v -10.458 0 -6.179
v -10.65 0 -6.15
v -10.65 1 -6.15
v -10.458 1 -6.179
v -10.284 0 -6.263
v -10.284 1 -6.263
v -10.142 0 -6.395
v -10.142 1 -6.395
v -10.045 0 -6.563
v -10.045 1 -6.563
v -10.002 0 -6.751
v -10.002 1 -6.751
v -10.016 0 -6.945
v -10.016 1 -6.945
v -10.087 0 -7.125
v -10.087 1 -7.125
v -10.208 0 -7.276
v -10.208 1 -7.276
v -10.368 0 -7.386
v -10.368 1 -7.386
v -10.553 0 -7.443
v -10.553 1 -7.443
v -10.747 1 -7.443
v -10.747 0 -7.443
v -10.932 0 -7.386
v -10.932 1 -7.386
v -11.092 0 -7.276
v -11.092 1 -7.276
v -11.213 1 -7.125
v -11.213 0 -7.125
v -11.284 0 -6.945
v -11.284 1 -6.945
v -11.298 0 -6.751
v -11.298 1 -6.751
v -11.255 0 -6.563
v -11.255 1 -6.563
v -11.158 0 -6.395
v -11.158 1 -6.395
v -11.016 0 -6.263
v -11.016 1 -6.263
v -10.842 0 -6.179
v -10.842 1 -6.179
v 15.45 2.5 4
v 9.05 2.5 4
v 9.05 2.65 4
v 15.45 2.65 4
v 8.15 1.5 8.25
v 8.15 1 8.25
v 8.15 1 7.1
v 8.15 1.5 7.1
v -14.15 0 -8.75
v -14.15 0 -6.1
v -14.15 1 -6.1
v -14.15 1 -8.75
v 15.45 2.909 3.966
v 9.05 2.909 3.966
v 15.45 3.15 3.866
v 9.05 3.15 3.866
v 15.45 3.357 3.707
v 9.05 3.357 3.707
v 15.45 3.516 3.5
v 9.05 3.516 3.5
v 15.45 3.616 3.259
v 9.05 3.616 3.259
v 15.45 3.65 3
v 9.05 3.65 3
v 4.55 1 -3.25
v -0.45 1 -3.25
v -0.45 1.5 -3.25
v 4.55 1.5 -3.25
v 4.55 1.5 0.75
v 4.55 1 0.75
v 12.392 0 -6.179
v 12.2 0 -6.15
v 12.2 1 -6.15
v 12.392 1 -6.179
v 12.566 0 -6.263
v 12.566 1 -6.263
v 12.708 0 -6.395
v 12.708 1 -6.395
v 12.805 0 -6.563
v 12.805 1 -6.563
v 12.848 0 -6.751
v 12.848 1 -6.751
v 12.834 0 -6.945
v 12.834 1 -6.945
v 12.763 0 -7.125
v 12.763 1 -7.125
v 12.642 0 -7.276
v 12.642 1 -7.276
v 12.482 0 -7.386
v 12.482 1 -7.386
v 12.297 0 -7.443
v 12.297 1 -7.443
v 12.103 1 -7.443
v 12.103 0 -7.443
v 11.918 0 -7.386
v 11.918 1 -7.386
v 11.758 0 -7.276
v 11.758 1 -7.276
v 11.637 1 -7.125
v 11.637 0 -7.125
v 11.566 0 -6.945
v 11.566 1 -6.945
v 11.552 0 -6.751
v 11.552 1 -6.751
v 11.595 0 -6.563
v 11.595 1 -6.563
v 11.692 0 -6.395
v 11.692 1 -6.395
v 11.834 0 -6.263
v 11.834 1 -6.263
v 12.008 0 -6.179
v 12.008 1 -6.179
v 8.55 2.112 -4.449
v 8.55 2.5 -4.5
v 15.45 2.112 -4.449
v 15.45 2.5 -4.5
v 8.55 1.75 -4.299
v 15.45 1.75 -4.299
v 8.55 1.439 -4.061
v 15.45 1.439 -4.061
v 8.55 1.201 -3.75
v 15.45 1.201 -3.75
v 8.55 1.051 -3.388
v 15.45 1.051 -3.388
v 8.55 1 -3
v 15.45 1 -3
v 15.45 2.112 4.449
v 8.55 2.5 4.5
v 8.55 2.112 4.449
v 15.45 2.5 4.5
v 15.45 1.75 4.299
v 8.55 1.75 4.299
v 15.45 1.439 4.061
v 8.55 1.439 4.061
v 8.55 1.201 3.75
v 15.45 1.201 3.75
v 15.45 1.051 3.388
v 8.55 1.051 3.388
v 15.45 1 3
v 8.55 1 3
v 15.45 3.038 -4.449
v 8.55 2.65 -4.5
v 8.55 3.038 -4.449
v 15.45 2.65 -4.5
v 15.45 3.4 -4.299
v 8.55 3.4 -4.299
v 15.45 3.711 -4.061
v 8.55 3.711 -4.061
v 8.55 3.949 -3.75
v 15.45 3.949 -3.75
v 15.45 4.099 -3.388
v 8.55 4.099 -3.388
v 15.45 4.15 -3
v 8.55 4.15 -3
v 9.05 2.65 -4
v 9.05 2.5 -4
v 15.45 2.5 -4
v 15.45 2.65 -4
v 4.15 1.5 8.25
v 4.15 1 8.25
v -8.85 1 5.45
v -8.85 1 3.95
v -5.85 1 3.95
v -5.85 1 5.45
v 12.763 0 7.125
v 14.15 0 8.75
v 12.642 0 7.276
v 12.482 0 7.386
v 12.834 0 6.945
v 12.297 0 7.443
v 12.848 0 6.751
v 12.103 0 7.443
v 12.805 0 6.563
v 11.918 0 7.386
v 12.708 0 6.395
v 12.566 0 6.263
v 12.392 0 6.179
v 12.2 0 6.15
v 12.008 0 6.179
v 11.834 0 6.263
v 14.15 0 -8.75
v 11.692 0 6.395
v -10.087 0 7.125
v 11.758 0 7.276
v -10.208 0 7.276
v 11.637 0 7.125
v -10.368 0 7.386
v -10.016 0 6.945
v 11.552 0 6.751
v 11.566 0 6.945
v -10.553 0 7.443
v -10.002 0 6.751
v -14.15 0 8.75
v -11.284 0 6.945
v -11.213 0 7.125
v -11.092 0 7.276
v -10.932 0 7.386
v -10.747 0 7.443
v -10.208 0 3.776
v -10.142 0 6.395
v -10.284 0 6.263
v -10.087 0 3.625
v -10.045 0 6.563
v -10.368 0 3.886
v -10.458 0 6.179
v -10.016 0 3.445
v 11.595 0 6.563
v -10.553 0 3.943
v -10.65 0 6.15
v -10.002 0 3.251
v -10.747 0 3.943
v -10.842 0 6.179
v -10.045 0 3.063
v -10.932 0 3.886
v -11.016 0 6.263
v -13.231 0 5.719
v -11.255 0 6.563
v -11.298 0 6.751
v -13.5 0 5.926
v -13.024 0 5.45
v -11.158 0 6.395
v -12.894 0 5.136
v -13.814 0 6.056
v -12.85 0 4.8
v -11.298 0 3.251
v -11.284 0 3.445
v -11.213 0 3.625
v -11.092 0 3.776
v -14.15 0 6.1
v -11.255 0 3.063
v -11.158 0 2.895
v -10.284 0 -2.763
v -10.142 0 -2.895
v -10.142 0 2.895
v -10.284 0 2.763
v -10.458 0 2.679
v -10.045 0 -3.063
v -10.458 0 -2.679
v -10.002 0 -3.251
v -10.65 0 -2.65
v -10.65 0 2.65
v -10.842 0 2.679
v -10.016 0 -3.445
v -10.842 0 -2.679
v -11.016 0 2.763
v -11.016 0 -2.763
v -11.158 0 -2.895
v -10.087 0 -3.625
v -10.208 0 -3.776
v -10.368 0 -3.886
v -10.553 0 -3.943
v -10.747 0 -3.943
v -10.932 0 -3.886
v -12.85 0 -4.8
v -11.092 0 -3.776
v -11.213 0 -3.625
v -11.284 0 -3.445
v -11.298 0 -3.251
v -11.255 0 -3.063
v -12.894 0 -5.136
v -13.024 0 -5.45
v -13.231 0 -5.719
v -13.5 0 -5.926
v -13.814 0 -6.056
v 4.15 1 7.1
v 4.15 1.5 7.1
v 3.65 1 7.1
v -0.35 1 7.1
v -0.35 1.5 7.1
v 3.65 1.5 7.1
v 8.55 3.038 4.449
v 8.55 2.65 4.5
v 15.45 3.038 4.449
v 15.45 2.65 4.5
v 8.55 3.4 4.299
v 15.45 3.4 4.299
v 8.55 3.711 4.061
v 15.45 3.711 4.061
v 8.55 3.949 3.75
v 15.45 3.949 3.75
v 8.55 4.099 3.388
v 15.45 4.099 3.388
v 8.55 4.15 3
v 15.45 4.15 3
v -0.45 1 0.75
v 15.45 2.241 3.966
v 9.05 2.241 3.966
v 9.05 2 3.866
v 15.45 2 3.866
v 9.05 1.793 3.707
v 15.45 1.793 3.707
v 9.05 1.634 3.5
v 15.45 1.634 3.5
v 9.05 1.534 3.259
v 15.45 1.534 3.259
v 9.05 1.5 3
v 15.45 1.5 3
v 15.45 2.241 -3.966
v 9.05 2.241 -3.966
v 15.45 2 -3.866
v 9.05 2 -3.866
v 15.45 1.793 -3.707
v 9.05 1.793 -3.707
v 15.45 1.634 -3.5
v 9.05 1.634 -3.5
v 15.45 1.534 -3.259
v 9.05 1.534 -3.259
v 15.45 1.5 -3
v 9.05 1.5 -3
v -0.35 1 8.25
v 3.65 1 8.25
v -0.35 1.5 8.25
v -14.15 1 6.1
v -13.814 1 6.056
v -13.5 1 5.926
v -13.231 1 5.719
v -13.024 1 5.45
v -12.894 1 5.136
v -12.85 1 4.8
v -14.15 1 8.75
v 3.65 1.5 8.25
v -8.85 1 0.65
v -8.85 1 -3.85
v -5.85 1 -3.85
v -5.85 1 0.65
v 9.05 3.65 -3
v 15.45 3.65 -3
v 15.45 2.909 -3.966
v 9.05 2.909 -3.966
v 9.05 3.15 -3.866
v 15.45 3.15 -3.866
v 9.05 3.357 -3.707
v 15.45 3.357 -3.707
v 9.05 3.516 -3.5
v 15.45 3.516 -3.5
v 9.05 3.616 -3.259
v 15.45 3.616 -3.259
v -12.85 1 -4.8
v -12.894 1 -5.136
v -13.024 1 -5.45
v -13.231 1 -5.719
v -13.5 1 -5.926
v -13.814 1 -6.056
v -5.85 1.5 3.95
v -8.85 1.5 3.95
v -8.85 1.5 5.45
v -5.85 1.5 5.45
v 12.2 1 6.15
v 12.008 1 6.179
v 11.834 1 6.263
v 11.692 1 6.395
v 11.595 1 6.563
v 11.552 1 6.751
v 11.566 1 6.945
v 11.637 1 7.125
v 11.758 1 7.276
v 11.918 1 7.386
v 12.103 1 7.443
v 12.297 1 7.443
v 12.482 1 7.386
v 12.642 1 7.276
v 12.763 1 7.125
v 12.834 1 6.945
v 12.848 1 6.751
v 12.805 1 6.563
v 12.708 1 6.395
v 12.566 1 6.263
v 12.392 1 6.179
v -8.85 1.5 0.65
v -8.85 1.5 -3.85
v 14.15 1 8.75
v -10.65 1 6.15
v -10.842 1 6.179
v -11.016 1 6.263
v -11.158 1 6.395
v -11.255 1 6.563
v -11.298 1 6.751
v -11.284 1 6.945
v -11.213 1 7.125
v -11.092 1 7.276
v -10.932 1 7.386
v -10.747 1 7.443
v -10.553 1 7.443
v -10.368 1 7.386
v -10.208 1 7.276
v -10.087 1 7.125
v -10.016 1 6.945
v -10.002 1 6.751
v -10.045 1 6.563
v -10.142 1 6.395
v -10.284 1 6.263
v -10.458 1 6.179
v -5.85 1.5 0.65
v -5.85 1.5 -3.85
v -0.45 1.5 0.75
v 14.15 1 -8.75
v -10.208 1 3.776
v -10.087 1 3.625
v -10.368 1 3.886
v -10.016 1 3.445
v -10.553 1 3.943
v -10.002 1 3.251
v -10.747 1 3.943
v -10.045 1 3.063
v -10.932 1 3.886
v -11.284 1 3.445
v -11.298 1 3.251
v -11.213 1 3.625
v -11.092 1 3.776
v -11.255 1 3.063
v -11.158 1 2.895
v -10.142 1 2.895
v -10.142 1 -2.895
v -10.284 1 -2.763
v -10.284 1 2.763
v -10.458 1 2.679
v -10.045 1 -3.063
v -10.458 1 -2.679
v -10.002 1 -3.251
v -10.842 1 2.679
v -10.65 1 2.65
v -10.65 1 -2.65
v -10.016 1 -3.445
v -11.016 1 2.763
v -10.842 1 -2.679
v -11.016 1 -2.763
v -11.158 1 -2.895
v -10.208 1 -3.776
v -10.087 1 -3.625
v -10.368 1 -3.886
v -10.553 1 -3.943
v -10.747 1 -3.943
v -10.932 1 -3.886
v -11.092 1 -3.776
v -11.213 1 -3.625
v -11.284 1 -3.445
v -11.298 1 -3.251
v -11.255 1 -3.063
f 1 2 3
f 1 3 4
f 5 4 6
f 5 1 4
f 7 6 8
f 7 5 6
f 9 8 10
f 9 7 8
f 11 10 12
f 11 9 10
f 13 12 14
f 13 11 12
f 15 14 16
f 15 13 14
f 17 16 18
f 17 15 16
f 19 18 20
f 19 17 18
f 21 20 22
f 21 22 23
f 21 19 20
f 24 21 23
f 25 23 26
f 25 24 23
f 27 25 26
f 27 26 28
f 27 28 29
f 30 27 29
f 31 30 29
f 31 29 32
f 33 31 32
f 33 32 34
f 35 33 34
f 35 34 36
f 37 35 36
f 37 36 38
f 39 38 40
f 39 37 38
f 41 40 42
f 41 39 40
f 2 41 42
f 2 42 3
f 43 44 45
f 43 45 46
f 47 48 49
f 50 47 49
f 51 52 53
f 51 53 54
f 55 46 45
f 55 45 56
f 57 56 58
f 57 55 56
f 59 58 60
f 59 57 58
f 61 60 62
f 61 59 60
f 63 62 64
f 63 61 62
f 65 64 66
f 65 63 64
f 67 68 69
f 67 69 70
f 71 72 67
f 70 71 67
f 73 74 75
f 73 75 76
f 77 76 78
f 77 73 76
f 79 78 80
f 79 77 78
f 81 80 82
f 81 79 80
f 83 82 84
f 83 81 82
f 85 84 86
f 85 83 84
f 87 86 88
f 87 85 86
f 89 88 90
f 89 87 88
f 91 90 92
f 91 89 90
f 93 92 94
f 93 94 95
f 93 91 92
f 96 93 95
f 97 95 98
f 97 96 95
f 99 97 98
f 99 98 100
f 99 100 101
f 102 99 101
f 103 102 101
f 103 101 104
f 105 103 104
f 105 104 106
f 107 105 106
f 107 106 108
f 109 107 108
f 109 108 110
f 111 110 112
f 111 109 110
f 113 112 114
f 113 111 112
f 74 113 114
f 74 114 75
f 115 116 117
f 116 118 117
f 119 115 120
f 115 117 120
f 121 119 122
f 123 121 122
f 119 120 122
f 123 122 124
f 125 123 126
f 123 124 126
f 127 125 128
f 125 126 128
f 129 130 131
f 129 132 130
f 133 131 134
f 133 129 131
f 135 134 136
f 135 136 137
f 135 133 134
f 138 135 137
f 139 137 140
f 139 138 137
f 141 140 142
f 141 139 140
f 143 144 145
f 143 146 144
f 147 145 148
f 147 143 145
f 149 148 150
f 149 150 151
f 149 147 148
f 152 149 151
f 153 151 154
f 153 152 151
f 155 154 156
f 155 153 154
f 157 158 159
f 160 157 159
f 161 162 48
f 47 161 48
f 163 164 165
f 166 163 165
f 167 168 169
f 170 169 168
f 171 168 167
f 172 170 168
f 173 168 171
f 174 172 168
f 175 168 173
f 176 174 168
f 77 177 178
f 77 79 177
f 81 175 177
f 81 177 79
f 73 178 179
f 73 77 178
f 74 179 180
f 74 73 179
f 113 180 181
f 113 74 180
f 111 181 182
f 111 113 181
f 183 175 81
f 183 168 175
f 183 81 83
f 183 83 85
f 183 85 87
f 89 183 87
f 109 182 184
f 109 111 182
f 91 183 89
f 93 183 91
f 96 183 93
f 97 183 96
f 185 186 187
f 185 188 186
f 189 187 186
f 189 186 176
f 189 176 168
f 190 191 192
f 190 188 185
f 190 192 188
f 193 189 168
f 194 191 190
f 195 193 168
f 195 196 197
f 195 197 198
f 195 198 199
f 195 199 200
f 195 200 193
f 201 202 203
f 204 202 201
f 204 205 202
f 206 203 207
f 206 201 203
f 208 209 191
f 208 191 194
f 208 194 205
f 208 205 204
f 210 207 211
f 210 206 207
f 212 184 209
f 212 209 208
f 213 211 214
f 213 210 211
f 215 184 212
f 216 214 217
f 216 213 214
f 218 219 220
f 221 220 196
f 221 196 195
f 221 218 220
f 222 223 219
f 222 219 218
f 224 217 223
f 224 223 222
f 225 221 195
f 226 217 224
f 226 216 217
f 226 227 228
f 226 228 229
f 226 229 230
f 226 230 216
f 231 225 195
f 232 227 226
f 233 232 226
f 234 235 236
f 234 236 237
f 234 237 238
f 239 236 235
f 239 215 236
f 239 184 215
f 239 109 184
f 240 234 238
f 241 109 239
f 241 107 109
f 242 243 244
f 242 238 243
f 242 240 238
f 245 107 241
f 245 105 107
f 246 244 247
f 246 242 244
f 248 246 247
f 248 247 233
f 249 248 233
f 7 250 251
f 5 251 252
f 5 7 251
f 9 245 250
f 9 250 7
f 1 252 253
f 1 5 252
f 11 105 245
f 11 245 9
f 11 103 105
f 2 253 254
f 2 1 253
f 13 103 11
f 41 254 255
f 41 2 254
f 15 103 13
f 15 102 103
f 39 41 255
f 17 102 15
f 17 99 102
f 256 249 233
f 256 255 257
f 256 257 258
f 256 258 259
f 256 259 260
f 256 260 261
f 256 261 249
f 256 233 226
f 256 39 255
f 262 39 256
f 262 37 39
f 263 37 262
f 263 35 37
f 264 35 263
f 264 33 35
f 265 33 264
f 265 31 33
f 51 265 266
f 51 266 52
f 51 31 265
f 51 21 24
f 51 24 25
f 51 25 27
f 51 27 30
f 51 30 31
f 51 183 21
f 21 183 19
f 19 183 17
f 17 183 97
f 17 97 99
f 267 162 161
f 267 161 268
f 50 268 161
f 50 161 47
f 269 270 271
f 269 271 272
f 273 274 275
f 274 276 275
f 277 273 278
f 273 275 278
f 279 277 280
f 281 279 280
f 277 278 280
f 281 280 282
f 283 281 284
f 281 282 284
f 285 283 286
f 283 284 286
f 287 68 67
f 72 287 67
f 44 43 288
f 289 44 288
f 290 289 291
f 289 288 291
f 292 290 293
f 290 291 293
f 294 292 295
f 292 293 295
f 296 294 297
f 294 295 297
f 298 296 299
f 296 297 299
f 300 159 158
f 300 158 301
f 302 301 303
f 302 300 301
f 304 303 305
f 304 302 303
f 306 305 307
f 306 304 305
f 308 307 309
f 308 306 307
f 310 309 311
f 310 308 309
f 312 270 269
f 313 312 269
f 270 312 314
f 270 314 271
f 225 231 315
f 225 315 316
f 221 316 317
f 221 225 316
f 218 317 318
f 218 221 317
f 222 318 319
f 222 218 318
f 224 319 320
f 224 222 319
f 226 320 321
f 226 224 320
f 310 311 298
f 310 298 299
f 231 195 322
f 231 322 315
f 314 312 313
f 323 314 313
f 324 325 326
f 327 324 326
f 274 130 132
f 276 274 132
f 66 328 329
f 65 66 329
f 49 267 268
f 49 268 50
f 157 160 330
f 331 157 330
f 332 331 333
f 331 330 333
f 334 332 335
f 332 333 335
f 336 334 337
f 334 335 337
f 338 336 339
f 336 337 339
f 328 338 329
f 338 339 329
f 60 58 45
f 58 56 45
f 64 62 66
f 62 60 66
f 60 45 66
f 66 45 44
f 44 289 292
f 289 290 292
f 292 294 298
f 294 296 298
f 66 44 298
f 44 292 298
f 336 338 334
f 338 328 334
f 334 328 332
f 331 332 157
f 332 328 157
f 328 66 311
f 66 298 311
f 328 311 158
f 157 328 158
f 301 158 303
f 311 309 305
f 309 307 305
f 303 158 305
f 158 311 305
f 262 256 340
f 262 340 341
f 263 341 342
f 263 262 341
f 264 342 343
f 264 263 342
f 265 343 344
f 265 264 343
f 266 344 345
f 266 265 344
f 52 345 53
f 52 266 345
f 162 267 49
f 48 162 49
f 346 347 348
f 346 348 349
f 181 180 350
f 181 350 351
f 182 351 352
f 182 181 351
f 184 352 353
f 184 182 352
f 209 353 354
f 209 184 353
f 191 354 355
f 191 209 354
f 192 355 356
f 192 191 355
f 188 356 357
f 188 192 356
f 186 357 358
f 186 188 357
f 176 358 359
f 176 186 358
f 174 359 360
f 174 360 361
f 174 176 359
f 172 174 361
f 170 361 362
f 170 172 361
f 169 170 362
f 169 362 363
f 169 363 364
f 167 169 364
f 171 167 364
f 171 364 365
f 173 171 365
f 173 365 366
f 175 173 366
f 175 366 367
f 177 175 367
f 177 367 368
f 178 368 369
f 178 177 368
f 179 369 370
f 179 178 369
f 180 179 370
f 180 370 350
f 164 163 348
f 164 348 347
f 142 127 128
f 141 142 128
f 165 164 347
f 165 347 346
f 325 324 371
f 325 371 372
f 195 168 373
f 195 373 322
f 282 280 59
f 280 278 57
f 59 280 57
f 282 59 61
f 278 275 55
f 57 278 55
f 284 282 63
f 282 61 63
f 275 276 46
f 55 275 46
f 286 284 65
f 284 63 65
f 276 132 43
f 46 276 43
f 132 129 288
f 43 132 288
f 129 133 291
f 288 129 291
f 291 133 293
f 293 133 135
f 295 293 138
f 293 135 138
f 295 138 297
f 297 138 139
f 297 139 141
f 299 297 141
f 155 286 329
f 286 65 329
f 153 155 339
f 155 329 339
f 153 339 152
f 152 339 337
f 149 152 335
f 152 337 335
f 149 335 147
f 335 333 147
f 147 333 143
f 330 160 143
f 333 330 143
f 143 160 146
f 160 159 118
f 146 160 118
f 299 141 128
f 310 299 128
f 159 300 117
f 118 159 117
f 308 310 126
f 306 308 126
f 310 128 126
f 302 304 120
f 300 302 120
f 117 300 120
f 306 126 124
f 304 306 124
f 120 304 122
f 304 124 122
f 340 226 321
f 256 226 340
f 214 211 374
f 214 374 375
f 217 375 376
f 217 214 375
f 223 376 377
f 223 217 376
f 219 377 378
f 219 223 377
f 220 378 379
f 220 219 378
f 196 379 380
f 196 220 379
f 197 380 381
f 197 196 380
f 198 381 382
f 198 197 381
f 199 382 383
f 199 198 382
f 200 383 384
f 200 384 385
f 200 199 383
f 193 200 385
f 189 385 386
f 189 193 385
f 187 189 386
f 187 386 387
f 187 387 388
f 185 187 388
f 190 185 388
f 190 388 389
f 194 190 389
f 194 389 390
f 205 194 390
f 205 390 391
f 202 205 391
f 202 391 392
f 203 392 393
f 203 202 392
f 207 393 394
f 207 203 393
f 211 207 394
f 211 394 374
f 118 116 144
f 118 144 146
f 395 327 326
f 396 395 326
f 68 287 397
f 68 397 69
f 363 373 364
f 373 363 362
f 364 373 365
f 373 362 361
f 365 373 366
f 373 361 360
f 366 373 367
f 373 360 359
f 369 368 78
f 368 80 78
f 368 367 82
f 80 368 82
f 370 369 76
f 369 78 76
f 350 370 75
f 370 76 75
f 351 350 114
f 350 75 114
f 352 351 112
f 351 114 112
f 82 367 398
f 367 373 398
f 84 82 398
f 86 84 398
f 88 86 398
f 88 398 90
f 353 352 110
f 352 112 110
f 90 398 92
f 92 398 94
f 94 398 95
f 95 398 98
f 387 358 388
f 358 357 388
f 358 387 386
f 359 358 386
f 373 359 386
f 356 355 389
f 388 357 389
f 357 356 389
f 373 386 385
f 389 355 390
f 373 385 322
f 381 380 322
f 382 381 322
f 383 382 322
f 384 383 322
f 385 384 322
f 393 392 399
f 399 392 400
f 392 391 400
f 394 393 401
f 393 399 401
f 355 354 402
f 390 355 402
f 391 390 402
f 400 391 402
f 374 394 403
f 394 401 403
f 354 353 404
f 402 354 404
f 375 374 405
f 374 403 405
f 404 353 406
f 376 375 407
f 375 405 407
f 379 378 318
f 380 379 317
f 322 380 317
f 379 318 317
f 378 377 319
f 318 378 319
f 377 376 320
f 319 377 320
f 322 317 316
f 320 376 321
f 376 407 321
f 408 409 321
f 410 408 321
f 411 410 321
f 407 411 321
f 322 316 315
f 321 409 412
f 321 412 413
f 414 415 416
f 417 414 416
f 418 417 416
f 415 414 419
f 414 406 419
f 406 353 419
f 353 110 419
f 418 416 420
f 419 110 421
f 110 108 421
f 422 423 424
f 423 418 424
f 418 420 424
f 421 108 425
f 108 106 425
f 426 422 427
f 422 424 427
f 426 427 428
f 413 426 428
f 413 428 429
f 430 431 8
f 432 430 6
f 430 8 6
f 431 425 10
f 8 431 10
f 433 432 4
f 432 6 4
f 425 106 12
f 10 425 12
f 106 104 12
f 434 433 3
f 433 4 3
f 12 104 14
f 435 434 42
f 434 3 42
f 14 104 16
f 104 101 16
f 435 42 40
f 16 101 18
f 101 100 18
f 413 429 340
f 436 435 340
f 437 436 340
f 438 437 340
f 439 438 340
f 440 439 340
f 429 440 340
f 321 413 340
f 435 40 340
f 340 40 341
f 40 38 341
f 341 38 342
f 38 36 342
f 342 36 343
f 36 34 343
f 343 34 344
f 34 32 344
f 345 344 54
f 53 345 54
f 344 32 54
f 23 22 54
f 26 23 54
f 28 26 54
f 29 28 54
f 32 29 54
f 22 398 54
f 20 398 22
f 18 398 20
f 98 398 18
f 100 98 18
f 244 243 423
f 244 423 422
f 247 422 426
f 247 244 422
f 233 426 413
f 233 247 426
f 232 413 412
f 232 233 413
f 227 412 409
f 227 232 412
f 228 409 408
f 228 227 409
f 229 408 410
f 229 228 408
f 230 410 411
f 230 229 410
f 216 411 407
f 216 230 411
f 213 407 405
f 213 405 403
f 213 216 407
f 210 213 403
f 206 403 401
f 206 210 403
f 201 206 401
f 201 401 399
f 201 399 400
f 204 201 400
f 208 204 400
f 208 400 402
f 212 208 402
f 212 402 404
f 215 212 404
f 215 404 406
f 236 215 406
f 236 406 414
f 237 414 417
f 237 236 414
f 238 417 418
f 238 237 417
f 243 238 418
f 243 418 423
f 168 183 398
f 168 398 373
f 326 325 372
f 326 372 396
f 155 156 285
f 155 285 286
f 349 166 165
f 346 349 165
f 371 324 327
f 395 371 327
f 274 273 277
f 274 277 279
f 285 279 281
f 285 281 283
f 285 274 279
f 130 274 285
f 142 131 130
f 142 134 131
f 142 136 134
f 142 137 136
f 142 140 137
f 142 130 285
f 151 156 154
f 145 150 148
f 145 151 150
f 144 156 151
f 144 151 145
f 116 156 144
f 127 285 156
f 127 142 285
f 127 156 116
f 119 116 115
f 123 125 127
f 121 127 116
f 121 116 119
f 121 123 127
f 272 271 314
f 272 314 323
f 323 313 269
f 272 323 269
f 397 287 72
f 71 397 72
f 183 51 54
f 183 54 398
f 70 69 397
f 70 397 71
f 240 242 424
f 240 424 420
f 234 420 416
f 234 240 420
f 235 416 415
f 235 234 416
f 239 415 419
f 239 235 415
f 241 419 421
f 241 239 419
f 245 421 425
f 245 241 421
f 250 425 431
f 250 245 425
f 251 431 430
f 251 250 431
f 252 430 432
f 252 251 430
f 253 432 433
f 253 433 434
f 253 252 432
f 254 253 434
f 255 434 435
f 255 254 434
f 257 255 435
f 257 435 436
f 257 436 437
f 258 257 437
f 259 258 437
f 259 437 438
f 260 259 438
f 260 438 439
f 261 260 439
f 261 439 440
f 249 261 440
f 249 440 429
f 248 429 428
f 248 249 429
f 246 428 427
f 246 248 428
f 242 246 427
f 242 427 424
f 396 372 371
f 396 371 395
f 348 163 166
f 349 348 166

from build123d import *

# Parameters (mm, degrees)
CROQUIS1_R                = 0.65
SALIENTE_EXTRUIR1_DEPTH   = 1
CROQUIS2_W                = 6.9
CROQUIS2_H                = 9
SALIENTE_EXTRUIR2_DEPTH   = 3.15
REDONDEO1_R               = 1.5
VACIADO1_T                = -0.5
CROQUIS3_W                = 4
CROQUIS3_H                = 1.15
SALIENTE_EXTRUIR3_DEPTH   = 0.5
SALIENTE_EXTRUIR3_2_DEPTH = 0.5
CROQUIS4_W                = 3
CROQUIS4_H                = 1.5
SALIENTE_EXTRUIR4_DEPTH   = 0.5
CROQUIS4_H_2              = 4.5
SALIENTE_EXTRUIR4_2_DEPTH = 0.5
CROQUIS4_W_2              = 5
CROQUIS4_H_3              = 4
SALIENTE_EXTRUIR4_3_DEPTH = 0.5


with BuildPart() as part:
    # Croquis1 → Saliente-Extruir1 (new body)
    with BuildSketch(Plane(origin=(0, 0, 0), x_dir=(1, 0, 0), z_dir=(0, 1, 0))):
        with BuildLine():
            Line((-14.15, 8.75), (14.15, 8.75))
            Line((14.15, 8.75), (14.15, -8.75))
            Line((14.15, -8.75), (-14.15, -8.75))
            Line((-14.15, -8.75), (-14.15, -6.1))
            ThreePointArc((-14.15, -6.1), (-13.230761184, -5.719238816), (-12.85, -4.8))
            Line((-12.85, -4.8), (-12.85, 4.8))
            ThreePointArc((-12.85, 4.8), (-13.230761184, 5.719238816), (-14.15, 6.1))
            Line((-14.15, 6.1), (-14.15, 8.75))
        make_face()
        with Locations(Location((12.2, 6.8, 0), (0, 0, 270))):
            Circle(CROQUIS1_R, mode=Mode.SUBTRACT)
        with Locations(Location((12.2, -6.8, 0), (0, 0, 90))):
            Circle(CROQUIS1_R, mode=Mode.SUBTRACT)
        with Locations(Location((-10.65, 6.8, 0), (0, 0, 270))):
            Circle(CROQUIS1_R, mode=Mode.SUBTRACT)
        with Locations(Location((-10.65, 3.3, 0), (0, 0, 270))):
            Circle(CROQUIS1_R, mode=Mode.SUBTRACT)
        with Locations(Location((-10.65, -3.3, 0), (0, 0, 90))):
            Circle(CROQUIS1_R, mode=Mode.SUBTRACT)
        with Locations(Location((-10.65, -6.8, 0), (0, 0, 90))):
            Circle(CROQUIS1_R, mode=Mode.SUBTRACT)
    extrude(amount=SALIENTE_EXTRUIR1_DEPTH)


with BuildPart() as body_2:
    # Croquis2 → Saliente-Extruir2 (new body)
    with BuildSketch(Plane(origin=(0, 1, 0), x_dir=(1, 0, 0), z_dir=(0, 1, 0))):
        with Locations((12, 0)):
            Rectangle(CROQUIS2_W, CROQUIS2_H)
    extrude(amount=SALIENTE_EXTRUIR2_DEPTH)

    # Redondeo1
    redondeo1_edges = [body_2.edges().sort_by_distance(p)[0] for p in [
        (12, 4.15, -4.5),
        (12, 1, -4.5),
        (12, 1, 4.5),
        (12, 4.15, 4.5),
    ]]
    fillet(redondeo1_edges, radius=REDONDEO1_R)

    # Vaciado1
    vaciado1_openings = [body_2.faces().sort_by_distance(p)[0] for p in [
        (15.45, 2.575, 0),
    ]]
    offset(amount=VACIADO1_T, openings=vaciado1_openings, kind=Kind.INTERSECTION)


with BuildPart() as body_3:
    # Croquis3 → Saliente-Extruir3 (new body)
    with BuildSketch(Plane(origin=(0, 1, 0), x_dir=(1, 0, 0), z_dir=(0, 1, 0))):
        with Locations((1.65, -7.675)):
            Rectangle(CROQUIS3_W, CROQUIS3_H)
    extrude(amount=SALIENTE_EXTRUIR3_DEPTH)


with BuildPart() as body_4:
    # Croquis3 → Saliente-Extruir3 2 (new body)
    with BuildSketch(Plane(origin=(0, 1, 0), x_dir=(1, 0, 0), z_dir=(0, 1, 0))):
        with Locations((6.15, -7.675)):
            Rectangle(CROQUIS3_W, CROQUIS3_H)
    extrude(amount=SALIENTE_EXTRUIR3_2_DEPTH)


with BuildPart() as body_5:
    # Croquis4 → Saliente-Extruir4 (new body)
    with BuildSketch(Plane(origin=(0, 1, 0), x_dir=(1, 0, 0), z_dir=(0, 1, 0))):
        with Locations((-7.35, -4.7)):
            Rectangle(CROQUIS4_W, CROQUIS4_H)
    extrude(amount=SALIENTE_EXTRUIR4_DEPTH)


with BuildPart() as body_6:
    # Croquis4 → Saliente-Extruir4 2 (new body)
    with BuildSketch(Plane(origin=(0, 1, 0), x_dir=(1, 0, 0), z_dir=(0, 1, 0))):
        with Locations((-7.35, 1.6)):
            Rectangle(CROQUIS4_W, CROQUIS4_H_2)
    extrude(amount=SALIENTE_EXTRUIR4_2_DEPTH)


with BuildPart() as body_7:
    # Croquis4 → Saliente-Extruir4 3 (new body)
    with BuildSketch(Plane(origin=(0, 1, 0), x_dir=(1, 0, 0), z_dir=(0, 1, 0))):
        with Locations((2.05, 1.25)):
            Rectangle(CROQUIS4_W_2, CROQUIS4_H_3)
    extrude(amount=SALIENTE_EXTRUIR4_3_DEPTH)


solid = Compound([part.part, body_2.part, body_3.part, body_4.part, body_5.part, body_6.part, body_7.part])
